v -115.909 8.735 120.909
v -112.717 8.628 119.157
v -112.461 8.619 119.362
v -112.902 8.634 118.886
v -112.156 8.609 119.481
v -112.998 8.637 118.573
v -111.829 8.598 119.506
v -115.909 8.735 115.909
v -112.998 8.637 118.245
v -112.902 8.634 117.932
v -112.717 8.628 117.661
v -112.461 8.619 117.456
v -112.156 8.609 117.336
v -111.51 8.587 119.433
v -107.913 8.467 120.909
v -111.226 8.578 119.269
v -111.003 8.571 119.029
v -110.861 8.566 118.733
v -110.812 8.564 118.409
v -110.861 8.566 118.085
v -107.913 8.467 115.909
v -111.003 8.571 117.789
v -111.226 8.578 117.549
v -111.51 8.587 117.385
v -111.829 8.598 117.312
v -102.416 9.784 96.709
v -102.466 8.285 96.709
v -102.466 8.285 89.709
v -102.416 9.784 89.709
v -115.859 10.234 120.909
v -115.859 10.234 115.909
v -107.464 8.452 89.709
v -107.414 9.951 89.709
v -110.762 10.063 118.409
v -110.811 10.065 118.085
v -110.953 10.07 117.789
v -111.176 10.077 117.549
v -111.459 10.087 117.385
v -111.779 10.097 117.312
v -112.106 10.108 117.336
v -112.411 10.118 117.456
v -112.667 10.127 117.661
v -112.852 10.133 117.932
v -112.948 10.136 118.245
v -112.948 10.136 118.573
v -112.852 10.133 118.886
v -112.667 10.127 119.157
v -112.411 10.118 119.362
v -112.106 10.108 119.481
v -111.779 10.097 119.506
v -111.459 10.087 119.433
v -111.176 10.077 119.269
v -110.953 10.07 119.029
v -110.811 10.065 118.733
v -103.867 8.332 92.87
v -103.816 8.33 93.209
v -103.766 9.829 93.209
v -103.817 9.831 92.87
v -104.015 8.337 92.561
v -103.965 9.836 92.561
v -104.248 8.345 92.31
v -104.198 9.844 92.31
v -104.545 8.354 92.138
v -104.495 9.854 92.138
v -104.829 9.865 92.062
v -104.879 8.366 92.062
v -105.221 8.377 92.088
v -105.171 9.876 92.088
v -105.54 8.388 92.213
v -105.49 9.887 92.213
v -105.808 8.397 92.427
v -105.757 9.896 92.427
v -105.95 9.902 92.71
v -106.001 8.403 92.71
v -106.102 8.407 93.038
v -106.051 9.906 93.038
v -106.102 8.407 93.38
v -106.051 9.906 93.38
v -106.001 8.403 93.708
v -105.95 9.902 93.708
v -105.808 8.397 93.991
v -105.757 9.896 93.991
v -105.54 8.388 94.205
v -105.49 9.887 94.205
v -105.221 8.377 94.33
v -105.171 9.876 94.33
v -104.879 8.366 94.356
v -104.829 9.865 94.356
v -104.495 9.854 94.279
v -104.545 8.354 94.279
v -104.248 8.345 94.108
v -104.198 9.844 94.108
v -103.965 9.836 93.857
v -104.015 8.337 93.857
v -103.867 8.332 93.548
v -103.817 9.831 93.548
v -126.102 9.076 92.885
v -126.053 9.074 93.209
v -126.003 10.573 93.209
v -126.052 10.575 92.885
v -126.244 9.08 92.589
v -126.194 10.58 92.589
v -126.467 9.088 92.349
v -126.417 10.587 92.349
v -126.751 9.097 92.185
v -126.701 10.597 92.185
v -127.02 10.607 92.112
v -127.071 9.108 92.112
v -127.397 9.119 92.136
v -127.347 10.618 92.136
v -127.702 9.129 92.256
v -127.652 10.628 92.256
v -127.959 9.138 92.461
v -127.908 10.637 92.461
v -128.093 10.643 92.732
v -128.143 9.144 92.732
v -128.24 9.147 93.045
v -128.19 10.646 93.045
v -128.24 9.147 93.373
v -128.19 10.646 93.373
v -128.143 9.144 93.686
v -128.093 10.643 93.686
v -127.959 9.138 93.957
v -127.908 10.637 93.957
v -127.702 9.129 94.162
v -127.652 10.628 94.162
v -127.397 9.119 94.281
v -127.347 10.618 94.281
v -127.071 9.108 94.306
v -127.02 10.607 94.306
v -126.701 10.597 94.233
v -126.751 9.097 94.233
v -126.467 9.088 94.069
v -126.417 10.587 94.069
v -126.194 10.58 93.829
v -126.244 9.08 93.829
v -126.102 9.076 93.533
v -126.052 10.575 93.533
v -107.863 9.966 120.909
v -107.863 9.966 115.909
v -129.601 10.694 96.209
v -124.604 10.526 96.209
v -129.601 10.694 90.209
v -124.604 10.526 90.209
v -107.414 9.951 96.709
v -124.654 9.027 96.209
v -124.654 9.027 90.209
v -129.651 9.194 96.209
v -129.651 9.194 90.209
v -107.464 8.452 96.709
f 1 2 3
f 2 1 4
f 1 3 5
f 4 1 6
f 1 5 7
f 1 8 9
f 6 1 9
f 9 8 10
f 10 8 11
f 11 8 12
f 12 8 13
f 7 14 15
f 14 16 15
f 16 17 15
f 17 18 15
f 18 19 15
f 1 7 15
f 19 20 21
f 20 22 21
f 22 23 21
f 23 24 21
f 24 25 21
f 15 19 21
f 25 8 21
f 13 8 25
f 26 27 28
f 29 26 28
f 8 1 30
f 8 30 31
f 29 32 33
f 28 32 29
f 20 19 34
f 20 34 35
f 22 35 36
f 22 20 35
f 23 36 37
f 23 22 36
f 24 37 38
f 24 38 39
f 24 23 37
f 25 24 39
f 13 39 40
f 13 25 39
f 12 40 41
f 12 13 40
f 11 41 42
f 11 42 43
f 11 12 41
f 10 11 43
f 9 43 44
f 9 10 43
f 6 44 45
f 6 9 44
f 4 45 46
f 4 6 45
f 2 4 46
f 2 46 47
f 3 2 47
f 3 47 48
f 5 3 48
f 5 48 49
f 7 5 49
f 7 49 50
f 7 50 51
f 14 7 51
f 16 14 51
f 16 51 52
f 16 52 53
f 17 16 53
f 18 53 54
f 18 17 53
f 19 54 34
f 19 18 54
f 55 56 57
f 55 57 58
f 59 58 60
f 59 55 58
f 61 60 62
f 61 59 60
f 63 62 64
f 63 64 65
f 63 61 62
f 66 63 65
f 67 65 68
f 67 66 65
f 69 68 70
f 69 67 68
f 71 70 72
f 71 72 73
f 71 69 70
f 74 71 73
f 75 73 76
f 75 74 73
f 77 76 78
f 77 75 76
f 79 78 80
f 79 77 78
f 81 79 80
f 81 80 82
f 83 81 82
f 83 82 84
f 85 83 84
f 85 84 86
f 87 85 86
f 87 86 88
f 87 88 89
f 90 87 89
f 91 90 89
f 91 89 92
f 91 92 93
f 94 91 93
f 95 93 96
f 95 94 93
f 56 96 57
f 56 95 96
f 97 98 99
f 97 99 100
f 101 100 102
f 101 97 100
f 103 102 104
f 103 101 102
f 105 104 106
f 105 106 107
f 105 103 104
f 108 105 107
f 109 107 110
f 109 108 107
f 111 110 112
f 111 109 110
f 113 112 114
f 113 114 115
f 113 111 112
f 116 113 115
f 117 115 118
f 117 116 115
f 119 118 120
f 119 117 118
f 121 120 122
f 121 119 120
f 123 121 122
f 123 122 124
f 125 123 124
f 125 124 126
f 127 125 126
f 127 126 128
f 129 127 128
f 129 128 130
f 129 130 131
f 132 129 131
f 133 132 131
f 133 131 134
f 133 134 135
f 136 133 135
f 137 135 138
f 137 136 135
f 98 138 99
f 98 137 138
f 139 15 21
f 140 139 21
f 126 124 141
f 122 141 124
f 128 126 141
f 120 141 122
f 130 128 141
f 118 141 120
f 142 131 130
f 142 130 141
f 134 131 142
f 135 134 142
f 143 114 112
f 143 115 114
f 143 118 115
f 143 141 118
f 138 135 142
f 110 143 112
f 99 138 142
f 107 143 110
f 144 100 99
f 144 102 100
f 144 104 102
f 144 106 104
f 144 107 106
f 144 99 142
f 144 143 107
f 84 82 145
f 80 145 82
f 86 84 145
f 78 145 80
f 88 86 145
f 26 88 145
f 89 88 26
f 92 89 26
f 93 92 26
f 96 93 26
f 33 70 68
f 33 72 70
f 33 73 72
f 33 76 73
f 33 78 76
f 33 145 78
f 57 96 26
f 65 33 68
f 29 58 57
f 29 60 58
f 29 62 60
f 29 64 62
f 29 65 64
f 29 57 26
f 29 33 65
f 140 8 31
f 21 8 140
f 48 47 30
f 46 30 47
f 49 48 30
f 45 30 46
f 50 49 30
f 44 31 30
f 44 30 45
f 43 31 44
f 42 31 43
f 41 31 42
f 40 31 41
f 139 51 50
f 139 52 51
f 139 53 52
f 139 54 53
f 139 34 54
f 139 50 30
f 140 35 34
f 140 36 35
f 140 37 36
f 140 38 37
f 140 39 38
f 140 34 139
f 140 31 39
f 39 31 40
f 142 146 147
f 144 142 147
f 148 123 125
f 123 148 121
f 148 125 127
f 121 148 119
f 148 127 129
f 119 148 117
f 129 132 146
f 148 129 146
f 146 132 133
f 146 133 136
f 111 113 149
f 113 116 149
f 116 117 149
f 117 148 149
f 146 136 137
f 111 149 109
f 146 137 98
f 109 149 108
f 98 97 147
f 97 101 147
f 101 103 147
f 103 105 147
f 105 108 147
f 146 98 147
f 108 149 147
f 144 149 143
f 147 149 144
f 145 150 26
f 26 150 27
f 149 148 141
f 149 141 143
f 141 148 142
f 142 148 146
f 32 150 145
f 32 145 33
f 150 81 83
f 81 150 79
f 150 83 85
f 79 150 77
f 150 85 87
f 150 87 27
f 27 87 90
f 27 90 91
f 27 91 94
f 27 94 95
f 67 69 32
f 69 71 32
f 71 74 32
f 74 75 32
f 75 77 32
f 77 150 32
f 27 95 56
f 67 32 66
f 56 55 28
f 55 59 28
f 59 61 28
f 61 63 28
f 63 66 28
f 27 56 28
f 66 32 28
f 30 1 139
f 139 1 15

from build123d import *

# Parameters (mm, degrees)
SKETCH1_W             = 8
SKETCH1_H             = 5
SKETCH1_R             = 1.1
BOSS_EXTRUDE1_DEPTH   = 1.5
SKETCH1_W_2           = 5
SKETCH1_H_2           = 7
SKETCH1_R_2           = 1.15
BOSS_EXTRUDE1_2_DEPTH = 1.5
SKETCH1_H_3           = 6.00000012
BOSS_EXTRUDE1_3_DEPTH = 1.5


with BuildPart() as part:
    # Sketch1 → Boss-Extrude1 (new body)
    with BuildSketch(Plane(origin=(0.162307687, 4.851343176, 0), x_dir=(0.999440809, -0.033437529, 0), z_dir=(0.033437529, 0.999440809, 0))):
        with Locations((-112.136220146, -118.408907113)):
            Rectangle(SKETCH1_W, SKETCH1_H)
        with Locations((-112.136220146, -118.408907113)):
            Circle(SKETCH1_R, mode=Mode.SUBTRACT)
    extrude(amount=BOSS_EXTRUDE1_DEPTH)


with BuildPart() as body_2:
    # Sketch1 → Boss-Extrude1 2 (new body)
    with BuildSketch(Plane(origin=(0.162307687, 4.851343176, 0), x_dir=(0.999440809, -0.033437529, 0), z_dir=(0.033437529, 0.999440809, 0))):
        with Locations((-105.186219044, -93.208907417)):
            Rectangle(SKETCH1_W_2, SKETCH1_H_2)
        with Locations((-105.186219044, -93.208907417)):
            Circle(SKETCH1_R_2, mode=Mode.SUBTRACT)
    extrude(amount=BOSS_EXTRUDE1_2_DEPTH)


with BuildPart() as body_3:
    # Sketch1 → Boss-Extrude1 3 (new body)
    with BuildSketch(Plane(origin=(0.162307687, 4.851343176, 0), x_dir=(0.999440809, -0.033437529, 0), z_dir=(0.033437529, 0.999440809, 0))):
        with Locations((-127.386219044, -93.208906265)):
            Rectangle(SKETCH1_W_2, SKETCH1_H_3)
        with Locations((-127.386219044, -93.208906447)):
            Circle(SKETCH1_R, mode=Mode.SUBTRACT)
    extrude(amount=BOSS_EXTRUDE1_3_DEPTH)


solid = Compound([part.part, body_2.part, body_3.part])
